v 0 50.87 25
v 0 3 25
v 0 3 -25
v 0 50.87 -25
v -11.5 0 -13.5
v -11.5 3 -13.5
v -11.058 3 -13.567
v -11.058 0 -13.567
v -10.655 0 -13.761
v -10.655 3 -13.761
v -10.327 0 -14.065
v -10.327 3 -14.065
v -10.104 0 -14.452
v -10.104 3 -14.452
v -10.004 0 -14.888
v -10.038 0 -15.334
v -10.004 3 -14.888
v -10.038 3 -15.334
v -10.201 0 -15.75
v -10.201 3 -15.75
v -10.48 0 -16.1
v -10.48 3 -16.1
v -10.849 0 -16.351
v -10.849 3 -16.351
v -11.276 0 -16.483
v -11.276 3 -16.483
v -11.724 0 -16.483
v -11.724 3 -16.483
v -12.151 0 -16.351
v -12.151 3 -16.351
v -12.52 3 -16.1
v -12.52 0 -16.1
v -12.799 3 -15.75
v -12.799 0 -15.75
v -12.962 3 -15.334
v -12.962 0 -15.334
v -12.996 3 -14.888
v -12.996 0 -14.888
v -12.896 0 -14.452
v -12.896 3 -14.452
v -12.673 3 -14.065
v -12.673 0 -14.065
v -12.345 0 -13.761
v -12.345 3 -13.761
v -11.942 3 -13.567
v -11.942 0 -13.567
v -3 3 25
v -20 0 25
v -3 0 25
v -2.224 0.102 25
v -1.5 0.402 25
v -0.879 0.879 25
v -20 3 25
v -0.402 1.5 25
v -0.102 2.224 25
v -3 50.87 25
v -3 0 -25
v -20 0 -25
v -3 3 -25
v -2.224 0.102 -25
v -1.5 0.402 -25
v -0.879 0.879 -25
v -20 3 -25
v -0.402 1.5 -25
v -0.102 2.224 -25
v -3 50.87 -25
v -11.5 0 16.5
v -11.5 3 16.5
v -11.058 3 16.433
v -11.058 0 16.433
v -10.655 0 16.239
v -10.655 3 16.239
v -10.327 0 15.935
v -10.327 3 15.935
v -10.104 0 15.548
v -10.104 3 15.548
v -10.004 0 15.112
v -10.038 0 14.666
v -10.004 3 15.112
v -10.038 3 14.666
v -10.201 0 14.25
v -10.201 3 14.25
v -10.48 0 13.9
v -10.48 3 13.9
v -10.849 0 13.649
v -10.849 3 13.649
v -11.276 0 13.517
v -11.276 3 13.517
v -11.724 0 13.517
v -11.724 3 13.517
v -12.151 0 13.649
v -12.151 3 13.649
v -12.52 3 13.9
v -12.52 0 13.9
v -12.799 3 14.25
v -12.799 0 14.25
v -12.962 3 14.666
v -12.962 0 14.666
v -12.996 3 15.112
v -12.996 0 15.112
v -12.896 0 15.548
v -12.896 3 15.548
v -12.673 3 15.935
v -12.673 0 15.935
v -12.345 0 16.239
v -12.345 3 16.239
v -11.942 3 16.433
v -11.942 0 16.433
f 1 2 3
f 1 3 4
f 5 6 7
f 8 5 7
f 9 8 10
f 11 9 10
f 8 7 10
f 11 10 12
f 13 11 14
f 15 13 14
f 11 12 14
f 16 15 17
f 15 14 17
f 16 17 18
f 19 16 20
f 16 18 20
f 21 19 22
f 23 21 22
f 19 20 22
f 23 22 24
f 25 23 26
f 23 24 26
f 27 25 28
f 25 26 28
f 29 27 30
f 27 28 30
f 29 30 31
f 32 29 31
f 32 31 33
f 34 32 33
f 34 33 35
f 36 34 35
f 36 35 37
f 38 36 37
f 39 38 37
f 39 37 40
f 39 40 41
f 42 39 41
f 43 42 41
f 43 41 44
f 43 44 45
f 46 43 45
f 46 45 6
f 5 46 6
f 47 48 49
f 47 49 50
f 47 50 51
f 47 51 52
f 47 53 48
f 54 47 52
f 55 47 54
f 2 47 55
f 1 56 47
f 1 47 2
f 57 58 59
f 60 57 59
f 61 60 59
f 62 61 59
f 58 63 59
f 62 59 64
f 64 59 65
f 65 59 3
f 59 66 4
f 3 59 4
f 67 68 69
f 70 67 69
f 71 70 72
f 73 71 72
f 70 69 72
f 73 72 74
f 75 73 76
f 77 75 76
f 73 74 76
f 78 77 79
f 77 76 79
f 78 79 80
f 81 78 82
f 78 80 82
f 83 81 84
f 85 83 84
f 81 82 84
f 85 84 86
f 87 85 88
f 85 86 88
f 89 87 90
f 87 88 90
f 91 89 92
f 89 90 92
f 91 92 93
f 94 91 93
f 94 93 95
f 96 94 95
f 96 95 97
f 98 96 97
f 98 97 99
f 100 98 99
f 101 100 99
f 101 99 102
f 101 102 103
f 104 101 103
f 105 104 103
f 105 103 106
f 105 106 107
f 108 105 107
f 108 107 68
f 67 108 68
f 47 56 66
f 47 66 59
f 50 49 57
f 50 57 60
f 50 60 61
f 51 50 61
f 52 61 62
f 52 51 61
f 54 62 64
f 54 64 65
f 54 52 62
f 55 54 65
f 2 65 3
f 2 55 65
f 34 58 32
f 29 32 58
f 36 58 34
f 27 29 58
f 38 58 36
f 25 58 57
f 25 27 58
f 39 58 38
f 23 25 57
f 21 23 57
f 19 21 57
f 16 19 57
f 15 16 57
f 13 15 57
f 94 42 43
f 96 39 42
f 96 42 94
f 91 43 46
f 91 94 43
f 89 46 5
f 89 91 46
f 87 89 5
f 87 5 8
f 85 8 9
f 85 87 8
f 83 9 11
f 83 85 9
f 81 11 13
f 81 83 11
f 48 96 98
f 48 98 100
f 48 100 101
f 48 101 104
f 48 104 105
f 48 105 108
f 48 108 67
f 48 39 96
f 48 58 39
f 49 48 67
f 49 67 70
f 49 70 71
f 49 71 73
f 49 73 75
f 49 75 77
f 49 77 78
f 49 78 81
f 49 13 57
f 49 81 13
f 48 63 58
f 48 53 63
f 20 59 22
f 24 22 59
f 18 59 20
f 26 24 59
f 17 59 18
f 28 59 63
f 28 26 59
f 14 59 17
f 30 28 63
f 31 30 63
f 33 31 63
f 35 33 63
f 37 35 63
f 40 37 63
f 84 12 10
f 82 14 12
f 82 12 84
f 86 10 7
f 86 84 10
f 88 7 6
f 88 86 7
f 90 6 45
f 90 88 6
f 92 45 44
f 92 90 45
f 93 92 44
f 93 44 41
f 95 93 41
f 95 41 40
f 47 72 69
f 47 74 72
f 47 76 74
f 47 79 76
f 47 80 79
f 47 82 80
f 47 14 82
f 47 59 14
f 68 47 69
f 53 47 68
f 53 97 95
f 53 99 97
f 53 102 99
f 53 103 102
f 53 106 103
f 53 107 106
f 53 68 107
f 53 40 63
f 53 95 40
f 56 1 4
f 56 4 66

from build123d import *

# Parameters (mm, degrees)
BOSS_EXTRU_1_DEPTH      = 25
ESQUISSE2_R             = 1.5
ENL_V_MAT_EXTRU_1_DEPTH = 50


with BuildPart() as part:
    # Esquisse1 → Boss.-Extru.1 (new, symmetric)
    with BuildSketch(Plane.XY):
        with BuildLine():
            Line((-20, 0), (-3, 0))
            ThreePointArc((-3, 0), (-0.878679656, 0.878679656), (0, 3))
            Line((0, 3), (0, 50.87))
            Line((0, 50.87), (-3, 50.87))
            Line((-3, 50.87), (-3, 3))
            Line((-3, 3), (-20, 3))
            Line((-20, 3), (-20, 0))
        make_face()
    extrude(amount=BOSS_EXTRU_1_DEPTH, both=True)

    # Esquisse2 → Enlèv. mat.-Extru.1 (cut)
    with BuildSketch(Plane(origin=(0, 3, 0), x_dir=(1, 0, 0), z_dir=(0, 1, 0))):
        with Locations(Location((-11.5, 15, 0), (0, 0, 270))):
            Circle(ESQUISSE2_R)
        with Locations(Location((-11.5, -15, 0), (0, 0, 270))):
            Circle(ESQUISSE2_R)
    extrude(amount=-ENL_V_MAT_EXTRU_1_DEPTH, mode=Mode.SUBTRACT)


solid = part.part
